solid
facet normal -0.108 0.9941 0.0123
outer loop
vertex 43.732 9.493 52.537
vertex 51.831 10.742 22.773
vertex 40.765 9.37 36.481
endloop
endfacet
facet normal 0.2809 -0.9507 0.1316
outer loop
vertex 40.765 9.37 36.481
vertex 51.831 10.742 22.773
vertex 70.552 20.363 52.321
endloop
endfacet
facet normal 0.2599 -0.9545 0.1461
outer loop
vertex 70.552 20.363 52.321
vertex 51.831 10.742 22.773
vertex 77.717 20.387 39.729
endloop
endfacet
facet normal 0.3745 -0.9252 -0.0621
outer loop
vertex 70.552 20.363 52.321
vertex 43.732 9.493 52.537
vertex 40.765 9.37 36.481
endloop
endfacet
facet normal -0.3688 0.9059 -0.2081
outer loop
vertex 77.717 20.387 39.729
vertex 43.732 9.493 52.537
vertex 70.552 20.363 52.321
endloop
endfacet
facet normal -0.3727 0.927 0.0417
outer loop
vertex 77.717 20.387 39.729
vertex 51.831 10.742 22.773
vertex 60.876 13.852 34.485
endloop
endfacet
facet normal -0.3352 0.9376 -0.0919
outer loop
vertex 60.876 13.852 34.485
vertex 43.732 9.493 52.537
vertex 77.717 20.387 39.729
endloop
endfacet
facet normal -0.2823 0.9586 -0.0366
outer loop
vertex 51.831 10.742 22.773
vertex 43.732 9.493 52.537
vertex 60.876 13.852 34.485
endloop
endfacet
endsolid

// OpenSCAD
// Auto-generated auxetic polyhedron
points = [
    [40.765239, 9.369752, 36.481113],
    [51.831034, 10.742253, 22.772811],
    [43.731645, 9.493391, 52.537112],
    [70.552460, 20.362570, 52.320591],
    [77.717245, 20.386785, 39.728880],
    [60.875660, 13.851694, 34.484824],
];

faces = [
    [0, 1, 2],
    [3, 1, 0],
    [4, 1, 3],
    [0, 2, 3],
    [3, 2, 4],
    [5, 1, 4],
    [4, 2, 5],
    [5, 2, 1],
];

polyhedron(points = points, faces = faces);
